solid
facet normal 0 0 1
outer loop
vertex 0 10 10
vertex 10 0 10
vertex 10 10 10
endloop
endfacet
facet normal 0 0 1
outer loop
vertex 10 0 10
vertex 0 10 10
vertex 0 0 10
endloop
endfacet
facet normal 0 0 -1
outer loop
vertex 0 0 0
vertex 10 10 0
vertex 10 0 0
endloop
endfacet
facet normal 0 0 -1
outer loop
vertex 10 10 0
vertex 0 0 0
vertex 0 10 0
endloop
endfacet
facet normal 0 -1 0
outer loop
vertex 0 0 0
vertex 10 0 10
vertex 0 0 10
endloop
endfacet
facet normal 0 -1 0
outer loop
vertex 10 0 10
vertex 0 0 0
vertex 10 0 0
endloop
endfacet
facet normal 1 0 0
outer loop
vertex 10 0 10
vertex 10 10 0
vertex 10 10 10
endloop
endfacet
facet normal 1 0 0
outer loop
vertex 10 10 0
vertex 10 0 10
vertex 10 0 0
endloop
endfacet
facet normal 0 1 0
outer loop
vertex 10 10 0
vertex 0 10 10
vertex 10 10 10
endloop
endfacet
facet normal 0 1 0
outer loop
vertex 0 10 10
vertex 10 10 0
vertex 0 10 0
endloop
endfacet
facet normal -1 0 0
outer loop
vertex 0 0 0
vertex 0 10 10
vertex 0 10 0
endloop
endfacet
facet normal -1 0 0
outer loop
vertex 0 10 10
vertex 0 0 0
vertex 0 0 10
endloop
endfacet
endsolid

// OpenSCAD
// SYMPTOM: a '%' background subtree (preview-only in OpenSCAD, NOT part of the
//   rendered result) was fused into the imported geometry, inflating it.
// CAUSE: importCSG kept and fused the background-modified child like any other.
// FIX: importCSG.py -> '%' background subtrees are removed from the document so
//   they do not contribute to the result. Commit 3ea6eb73e2.
// EXPECTED (OpenSCAD): the '%' cube is preview-only -> the rendered result is
//   just the first cube, volume 1000 (NOT 2000).
union() {
	cube([10, 10, 10]);
	%translate([20, 0, 0]) cube([10, 10, 10]);
}
